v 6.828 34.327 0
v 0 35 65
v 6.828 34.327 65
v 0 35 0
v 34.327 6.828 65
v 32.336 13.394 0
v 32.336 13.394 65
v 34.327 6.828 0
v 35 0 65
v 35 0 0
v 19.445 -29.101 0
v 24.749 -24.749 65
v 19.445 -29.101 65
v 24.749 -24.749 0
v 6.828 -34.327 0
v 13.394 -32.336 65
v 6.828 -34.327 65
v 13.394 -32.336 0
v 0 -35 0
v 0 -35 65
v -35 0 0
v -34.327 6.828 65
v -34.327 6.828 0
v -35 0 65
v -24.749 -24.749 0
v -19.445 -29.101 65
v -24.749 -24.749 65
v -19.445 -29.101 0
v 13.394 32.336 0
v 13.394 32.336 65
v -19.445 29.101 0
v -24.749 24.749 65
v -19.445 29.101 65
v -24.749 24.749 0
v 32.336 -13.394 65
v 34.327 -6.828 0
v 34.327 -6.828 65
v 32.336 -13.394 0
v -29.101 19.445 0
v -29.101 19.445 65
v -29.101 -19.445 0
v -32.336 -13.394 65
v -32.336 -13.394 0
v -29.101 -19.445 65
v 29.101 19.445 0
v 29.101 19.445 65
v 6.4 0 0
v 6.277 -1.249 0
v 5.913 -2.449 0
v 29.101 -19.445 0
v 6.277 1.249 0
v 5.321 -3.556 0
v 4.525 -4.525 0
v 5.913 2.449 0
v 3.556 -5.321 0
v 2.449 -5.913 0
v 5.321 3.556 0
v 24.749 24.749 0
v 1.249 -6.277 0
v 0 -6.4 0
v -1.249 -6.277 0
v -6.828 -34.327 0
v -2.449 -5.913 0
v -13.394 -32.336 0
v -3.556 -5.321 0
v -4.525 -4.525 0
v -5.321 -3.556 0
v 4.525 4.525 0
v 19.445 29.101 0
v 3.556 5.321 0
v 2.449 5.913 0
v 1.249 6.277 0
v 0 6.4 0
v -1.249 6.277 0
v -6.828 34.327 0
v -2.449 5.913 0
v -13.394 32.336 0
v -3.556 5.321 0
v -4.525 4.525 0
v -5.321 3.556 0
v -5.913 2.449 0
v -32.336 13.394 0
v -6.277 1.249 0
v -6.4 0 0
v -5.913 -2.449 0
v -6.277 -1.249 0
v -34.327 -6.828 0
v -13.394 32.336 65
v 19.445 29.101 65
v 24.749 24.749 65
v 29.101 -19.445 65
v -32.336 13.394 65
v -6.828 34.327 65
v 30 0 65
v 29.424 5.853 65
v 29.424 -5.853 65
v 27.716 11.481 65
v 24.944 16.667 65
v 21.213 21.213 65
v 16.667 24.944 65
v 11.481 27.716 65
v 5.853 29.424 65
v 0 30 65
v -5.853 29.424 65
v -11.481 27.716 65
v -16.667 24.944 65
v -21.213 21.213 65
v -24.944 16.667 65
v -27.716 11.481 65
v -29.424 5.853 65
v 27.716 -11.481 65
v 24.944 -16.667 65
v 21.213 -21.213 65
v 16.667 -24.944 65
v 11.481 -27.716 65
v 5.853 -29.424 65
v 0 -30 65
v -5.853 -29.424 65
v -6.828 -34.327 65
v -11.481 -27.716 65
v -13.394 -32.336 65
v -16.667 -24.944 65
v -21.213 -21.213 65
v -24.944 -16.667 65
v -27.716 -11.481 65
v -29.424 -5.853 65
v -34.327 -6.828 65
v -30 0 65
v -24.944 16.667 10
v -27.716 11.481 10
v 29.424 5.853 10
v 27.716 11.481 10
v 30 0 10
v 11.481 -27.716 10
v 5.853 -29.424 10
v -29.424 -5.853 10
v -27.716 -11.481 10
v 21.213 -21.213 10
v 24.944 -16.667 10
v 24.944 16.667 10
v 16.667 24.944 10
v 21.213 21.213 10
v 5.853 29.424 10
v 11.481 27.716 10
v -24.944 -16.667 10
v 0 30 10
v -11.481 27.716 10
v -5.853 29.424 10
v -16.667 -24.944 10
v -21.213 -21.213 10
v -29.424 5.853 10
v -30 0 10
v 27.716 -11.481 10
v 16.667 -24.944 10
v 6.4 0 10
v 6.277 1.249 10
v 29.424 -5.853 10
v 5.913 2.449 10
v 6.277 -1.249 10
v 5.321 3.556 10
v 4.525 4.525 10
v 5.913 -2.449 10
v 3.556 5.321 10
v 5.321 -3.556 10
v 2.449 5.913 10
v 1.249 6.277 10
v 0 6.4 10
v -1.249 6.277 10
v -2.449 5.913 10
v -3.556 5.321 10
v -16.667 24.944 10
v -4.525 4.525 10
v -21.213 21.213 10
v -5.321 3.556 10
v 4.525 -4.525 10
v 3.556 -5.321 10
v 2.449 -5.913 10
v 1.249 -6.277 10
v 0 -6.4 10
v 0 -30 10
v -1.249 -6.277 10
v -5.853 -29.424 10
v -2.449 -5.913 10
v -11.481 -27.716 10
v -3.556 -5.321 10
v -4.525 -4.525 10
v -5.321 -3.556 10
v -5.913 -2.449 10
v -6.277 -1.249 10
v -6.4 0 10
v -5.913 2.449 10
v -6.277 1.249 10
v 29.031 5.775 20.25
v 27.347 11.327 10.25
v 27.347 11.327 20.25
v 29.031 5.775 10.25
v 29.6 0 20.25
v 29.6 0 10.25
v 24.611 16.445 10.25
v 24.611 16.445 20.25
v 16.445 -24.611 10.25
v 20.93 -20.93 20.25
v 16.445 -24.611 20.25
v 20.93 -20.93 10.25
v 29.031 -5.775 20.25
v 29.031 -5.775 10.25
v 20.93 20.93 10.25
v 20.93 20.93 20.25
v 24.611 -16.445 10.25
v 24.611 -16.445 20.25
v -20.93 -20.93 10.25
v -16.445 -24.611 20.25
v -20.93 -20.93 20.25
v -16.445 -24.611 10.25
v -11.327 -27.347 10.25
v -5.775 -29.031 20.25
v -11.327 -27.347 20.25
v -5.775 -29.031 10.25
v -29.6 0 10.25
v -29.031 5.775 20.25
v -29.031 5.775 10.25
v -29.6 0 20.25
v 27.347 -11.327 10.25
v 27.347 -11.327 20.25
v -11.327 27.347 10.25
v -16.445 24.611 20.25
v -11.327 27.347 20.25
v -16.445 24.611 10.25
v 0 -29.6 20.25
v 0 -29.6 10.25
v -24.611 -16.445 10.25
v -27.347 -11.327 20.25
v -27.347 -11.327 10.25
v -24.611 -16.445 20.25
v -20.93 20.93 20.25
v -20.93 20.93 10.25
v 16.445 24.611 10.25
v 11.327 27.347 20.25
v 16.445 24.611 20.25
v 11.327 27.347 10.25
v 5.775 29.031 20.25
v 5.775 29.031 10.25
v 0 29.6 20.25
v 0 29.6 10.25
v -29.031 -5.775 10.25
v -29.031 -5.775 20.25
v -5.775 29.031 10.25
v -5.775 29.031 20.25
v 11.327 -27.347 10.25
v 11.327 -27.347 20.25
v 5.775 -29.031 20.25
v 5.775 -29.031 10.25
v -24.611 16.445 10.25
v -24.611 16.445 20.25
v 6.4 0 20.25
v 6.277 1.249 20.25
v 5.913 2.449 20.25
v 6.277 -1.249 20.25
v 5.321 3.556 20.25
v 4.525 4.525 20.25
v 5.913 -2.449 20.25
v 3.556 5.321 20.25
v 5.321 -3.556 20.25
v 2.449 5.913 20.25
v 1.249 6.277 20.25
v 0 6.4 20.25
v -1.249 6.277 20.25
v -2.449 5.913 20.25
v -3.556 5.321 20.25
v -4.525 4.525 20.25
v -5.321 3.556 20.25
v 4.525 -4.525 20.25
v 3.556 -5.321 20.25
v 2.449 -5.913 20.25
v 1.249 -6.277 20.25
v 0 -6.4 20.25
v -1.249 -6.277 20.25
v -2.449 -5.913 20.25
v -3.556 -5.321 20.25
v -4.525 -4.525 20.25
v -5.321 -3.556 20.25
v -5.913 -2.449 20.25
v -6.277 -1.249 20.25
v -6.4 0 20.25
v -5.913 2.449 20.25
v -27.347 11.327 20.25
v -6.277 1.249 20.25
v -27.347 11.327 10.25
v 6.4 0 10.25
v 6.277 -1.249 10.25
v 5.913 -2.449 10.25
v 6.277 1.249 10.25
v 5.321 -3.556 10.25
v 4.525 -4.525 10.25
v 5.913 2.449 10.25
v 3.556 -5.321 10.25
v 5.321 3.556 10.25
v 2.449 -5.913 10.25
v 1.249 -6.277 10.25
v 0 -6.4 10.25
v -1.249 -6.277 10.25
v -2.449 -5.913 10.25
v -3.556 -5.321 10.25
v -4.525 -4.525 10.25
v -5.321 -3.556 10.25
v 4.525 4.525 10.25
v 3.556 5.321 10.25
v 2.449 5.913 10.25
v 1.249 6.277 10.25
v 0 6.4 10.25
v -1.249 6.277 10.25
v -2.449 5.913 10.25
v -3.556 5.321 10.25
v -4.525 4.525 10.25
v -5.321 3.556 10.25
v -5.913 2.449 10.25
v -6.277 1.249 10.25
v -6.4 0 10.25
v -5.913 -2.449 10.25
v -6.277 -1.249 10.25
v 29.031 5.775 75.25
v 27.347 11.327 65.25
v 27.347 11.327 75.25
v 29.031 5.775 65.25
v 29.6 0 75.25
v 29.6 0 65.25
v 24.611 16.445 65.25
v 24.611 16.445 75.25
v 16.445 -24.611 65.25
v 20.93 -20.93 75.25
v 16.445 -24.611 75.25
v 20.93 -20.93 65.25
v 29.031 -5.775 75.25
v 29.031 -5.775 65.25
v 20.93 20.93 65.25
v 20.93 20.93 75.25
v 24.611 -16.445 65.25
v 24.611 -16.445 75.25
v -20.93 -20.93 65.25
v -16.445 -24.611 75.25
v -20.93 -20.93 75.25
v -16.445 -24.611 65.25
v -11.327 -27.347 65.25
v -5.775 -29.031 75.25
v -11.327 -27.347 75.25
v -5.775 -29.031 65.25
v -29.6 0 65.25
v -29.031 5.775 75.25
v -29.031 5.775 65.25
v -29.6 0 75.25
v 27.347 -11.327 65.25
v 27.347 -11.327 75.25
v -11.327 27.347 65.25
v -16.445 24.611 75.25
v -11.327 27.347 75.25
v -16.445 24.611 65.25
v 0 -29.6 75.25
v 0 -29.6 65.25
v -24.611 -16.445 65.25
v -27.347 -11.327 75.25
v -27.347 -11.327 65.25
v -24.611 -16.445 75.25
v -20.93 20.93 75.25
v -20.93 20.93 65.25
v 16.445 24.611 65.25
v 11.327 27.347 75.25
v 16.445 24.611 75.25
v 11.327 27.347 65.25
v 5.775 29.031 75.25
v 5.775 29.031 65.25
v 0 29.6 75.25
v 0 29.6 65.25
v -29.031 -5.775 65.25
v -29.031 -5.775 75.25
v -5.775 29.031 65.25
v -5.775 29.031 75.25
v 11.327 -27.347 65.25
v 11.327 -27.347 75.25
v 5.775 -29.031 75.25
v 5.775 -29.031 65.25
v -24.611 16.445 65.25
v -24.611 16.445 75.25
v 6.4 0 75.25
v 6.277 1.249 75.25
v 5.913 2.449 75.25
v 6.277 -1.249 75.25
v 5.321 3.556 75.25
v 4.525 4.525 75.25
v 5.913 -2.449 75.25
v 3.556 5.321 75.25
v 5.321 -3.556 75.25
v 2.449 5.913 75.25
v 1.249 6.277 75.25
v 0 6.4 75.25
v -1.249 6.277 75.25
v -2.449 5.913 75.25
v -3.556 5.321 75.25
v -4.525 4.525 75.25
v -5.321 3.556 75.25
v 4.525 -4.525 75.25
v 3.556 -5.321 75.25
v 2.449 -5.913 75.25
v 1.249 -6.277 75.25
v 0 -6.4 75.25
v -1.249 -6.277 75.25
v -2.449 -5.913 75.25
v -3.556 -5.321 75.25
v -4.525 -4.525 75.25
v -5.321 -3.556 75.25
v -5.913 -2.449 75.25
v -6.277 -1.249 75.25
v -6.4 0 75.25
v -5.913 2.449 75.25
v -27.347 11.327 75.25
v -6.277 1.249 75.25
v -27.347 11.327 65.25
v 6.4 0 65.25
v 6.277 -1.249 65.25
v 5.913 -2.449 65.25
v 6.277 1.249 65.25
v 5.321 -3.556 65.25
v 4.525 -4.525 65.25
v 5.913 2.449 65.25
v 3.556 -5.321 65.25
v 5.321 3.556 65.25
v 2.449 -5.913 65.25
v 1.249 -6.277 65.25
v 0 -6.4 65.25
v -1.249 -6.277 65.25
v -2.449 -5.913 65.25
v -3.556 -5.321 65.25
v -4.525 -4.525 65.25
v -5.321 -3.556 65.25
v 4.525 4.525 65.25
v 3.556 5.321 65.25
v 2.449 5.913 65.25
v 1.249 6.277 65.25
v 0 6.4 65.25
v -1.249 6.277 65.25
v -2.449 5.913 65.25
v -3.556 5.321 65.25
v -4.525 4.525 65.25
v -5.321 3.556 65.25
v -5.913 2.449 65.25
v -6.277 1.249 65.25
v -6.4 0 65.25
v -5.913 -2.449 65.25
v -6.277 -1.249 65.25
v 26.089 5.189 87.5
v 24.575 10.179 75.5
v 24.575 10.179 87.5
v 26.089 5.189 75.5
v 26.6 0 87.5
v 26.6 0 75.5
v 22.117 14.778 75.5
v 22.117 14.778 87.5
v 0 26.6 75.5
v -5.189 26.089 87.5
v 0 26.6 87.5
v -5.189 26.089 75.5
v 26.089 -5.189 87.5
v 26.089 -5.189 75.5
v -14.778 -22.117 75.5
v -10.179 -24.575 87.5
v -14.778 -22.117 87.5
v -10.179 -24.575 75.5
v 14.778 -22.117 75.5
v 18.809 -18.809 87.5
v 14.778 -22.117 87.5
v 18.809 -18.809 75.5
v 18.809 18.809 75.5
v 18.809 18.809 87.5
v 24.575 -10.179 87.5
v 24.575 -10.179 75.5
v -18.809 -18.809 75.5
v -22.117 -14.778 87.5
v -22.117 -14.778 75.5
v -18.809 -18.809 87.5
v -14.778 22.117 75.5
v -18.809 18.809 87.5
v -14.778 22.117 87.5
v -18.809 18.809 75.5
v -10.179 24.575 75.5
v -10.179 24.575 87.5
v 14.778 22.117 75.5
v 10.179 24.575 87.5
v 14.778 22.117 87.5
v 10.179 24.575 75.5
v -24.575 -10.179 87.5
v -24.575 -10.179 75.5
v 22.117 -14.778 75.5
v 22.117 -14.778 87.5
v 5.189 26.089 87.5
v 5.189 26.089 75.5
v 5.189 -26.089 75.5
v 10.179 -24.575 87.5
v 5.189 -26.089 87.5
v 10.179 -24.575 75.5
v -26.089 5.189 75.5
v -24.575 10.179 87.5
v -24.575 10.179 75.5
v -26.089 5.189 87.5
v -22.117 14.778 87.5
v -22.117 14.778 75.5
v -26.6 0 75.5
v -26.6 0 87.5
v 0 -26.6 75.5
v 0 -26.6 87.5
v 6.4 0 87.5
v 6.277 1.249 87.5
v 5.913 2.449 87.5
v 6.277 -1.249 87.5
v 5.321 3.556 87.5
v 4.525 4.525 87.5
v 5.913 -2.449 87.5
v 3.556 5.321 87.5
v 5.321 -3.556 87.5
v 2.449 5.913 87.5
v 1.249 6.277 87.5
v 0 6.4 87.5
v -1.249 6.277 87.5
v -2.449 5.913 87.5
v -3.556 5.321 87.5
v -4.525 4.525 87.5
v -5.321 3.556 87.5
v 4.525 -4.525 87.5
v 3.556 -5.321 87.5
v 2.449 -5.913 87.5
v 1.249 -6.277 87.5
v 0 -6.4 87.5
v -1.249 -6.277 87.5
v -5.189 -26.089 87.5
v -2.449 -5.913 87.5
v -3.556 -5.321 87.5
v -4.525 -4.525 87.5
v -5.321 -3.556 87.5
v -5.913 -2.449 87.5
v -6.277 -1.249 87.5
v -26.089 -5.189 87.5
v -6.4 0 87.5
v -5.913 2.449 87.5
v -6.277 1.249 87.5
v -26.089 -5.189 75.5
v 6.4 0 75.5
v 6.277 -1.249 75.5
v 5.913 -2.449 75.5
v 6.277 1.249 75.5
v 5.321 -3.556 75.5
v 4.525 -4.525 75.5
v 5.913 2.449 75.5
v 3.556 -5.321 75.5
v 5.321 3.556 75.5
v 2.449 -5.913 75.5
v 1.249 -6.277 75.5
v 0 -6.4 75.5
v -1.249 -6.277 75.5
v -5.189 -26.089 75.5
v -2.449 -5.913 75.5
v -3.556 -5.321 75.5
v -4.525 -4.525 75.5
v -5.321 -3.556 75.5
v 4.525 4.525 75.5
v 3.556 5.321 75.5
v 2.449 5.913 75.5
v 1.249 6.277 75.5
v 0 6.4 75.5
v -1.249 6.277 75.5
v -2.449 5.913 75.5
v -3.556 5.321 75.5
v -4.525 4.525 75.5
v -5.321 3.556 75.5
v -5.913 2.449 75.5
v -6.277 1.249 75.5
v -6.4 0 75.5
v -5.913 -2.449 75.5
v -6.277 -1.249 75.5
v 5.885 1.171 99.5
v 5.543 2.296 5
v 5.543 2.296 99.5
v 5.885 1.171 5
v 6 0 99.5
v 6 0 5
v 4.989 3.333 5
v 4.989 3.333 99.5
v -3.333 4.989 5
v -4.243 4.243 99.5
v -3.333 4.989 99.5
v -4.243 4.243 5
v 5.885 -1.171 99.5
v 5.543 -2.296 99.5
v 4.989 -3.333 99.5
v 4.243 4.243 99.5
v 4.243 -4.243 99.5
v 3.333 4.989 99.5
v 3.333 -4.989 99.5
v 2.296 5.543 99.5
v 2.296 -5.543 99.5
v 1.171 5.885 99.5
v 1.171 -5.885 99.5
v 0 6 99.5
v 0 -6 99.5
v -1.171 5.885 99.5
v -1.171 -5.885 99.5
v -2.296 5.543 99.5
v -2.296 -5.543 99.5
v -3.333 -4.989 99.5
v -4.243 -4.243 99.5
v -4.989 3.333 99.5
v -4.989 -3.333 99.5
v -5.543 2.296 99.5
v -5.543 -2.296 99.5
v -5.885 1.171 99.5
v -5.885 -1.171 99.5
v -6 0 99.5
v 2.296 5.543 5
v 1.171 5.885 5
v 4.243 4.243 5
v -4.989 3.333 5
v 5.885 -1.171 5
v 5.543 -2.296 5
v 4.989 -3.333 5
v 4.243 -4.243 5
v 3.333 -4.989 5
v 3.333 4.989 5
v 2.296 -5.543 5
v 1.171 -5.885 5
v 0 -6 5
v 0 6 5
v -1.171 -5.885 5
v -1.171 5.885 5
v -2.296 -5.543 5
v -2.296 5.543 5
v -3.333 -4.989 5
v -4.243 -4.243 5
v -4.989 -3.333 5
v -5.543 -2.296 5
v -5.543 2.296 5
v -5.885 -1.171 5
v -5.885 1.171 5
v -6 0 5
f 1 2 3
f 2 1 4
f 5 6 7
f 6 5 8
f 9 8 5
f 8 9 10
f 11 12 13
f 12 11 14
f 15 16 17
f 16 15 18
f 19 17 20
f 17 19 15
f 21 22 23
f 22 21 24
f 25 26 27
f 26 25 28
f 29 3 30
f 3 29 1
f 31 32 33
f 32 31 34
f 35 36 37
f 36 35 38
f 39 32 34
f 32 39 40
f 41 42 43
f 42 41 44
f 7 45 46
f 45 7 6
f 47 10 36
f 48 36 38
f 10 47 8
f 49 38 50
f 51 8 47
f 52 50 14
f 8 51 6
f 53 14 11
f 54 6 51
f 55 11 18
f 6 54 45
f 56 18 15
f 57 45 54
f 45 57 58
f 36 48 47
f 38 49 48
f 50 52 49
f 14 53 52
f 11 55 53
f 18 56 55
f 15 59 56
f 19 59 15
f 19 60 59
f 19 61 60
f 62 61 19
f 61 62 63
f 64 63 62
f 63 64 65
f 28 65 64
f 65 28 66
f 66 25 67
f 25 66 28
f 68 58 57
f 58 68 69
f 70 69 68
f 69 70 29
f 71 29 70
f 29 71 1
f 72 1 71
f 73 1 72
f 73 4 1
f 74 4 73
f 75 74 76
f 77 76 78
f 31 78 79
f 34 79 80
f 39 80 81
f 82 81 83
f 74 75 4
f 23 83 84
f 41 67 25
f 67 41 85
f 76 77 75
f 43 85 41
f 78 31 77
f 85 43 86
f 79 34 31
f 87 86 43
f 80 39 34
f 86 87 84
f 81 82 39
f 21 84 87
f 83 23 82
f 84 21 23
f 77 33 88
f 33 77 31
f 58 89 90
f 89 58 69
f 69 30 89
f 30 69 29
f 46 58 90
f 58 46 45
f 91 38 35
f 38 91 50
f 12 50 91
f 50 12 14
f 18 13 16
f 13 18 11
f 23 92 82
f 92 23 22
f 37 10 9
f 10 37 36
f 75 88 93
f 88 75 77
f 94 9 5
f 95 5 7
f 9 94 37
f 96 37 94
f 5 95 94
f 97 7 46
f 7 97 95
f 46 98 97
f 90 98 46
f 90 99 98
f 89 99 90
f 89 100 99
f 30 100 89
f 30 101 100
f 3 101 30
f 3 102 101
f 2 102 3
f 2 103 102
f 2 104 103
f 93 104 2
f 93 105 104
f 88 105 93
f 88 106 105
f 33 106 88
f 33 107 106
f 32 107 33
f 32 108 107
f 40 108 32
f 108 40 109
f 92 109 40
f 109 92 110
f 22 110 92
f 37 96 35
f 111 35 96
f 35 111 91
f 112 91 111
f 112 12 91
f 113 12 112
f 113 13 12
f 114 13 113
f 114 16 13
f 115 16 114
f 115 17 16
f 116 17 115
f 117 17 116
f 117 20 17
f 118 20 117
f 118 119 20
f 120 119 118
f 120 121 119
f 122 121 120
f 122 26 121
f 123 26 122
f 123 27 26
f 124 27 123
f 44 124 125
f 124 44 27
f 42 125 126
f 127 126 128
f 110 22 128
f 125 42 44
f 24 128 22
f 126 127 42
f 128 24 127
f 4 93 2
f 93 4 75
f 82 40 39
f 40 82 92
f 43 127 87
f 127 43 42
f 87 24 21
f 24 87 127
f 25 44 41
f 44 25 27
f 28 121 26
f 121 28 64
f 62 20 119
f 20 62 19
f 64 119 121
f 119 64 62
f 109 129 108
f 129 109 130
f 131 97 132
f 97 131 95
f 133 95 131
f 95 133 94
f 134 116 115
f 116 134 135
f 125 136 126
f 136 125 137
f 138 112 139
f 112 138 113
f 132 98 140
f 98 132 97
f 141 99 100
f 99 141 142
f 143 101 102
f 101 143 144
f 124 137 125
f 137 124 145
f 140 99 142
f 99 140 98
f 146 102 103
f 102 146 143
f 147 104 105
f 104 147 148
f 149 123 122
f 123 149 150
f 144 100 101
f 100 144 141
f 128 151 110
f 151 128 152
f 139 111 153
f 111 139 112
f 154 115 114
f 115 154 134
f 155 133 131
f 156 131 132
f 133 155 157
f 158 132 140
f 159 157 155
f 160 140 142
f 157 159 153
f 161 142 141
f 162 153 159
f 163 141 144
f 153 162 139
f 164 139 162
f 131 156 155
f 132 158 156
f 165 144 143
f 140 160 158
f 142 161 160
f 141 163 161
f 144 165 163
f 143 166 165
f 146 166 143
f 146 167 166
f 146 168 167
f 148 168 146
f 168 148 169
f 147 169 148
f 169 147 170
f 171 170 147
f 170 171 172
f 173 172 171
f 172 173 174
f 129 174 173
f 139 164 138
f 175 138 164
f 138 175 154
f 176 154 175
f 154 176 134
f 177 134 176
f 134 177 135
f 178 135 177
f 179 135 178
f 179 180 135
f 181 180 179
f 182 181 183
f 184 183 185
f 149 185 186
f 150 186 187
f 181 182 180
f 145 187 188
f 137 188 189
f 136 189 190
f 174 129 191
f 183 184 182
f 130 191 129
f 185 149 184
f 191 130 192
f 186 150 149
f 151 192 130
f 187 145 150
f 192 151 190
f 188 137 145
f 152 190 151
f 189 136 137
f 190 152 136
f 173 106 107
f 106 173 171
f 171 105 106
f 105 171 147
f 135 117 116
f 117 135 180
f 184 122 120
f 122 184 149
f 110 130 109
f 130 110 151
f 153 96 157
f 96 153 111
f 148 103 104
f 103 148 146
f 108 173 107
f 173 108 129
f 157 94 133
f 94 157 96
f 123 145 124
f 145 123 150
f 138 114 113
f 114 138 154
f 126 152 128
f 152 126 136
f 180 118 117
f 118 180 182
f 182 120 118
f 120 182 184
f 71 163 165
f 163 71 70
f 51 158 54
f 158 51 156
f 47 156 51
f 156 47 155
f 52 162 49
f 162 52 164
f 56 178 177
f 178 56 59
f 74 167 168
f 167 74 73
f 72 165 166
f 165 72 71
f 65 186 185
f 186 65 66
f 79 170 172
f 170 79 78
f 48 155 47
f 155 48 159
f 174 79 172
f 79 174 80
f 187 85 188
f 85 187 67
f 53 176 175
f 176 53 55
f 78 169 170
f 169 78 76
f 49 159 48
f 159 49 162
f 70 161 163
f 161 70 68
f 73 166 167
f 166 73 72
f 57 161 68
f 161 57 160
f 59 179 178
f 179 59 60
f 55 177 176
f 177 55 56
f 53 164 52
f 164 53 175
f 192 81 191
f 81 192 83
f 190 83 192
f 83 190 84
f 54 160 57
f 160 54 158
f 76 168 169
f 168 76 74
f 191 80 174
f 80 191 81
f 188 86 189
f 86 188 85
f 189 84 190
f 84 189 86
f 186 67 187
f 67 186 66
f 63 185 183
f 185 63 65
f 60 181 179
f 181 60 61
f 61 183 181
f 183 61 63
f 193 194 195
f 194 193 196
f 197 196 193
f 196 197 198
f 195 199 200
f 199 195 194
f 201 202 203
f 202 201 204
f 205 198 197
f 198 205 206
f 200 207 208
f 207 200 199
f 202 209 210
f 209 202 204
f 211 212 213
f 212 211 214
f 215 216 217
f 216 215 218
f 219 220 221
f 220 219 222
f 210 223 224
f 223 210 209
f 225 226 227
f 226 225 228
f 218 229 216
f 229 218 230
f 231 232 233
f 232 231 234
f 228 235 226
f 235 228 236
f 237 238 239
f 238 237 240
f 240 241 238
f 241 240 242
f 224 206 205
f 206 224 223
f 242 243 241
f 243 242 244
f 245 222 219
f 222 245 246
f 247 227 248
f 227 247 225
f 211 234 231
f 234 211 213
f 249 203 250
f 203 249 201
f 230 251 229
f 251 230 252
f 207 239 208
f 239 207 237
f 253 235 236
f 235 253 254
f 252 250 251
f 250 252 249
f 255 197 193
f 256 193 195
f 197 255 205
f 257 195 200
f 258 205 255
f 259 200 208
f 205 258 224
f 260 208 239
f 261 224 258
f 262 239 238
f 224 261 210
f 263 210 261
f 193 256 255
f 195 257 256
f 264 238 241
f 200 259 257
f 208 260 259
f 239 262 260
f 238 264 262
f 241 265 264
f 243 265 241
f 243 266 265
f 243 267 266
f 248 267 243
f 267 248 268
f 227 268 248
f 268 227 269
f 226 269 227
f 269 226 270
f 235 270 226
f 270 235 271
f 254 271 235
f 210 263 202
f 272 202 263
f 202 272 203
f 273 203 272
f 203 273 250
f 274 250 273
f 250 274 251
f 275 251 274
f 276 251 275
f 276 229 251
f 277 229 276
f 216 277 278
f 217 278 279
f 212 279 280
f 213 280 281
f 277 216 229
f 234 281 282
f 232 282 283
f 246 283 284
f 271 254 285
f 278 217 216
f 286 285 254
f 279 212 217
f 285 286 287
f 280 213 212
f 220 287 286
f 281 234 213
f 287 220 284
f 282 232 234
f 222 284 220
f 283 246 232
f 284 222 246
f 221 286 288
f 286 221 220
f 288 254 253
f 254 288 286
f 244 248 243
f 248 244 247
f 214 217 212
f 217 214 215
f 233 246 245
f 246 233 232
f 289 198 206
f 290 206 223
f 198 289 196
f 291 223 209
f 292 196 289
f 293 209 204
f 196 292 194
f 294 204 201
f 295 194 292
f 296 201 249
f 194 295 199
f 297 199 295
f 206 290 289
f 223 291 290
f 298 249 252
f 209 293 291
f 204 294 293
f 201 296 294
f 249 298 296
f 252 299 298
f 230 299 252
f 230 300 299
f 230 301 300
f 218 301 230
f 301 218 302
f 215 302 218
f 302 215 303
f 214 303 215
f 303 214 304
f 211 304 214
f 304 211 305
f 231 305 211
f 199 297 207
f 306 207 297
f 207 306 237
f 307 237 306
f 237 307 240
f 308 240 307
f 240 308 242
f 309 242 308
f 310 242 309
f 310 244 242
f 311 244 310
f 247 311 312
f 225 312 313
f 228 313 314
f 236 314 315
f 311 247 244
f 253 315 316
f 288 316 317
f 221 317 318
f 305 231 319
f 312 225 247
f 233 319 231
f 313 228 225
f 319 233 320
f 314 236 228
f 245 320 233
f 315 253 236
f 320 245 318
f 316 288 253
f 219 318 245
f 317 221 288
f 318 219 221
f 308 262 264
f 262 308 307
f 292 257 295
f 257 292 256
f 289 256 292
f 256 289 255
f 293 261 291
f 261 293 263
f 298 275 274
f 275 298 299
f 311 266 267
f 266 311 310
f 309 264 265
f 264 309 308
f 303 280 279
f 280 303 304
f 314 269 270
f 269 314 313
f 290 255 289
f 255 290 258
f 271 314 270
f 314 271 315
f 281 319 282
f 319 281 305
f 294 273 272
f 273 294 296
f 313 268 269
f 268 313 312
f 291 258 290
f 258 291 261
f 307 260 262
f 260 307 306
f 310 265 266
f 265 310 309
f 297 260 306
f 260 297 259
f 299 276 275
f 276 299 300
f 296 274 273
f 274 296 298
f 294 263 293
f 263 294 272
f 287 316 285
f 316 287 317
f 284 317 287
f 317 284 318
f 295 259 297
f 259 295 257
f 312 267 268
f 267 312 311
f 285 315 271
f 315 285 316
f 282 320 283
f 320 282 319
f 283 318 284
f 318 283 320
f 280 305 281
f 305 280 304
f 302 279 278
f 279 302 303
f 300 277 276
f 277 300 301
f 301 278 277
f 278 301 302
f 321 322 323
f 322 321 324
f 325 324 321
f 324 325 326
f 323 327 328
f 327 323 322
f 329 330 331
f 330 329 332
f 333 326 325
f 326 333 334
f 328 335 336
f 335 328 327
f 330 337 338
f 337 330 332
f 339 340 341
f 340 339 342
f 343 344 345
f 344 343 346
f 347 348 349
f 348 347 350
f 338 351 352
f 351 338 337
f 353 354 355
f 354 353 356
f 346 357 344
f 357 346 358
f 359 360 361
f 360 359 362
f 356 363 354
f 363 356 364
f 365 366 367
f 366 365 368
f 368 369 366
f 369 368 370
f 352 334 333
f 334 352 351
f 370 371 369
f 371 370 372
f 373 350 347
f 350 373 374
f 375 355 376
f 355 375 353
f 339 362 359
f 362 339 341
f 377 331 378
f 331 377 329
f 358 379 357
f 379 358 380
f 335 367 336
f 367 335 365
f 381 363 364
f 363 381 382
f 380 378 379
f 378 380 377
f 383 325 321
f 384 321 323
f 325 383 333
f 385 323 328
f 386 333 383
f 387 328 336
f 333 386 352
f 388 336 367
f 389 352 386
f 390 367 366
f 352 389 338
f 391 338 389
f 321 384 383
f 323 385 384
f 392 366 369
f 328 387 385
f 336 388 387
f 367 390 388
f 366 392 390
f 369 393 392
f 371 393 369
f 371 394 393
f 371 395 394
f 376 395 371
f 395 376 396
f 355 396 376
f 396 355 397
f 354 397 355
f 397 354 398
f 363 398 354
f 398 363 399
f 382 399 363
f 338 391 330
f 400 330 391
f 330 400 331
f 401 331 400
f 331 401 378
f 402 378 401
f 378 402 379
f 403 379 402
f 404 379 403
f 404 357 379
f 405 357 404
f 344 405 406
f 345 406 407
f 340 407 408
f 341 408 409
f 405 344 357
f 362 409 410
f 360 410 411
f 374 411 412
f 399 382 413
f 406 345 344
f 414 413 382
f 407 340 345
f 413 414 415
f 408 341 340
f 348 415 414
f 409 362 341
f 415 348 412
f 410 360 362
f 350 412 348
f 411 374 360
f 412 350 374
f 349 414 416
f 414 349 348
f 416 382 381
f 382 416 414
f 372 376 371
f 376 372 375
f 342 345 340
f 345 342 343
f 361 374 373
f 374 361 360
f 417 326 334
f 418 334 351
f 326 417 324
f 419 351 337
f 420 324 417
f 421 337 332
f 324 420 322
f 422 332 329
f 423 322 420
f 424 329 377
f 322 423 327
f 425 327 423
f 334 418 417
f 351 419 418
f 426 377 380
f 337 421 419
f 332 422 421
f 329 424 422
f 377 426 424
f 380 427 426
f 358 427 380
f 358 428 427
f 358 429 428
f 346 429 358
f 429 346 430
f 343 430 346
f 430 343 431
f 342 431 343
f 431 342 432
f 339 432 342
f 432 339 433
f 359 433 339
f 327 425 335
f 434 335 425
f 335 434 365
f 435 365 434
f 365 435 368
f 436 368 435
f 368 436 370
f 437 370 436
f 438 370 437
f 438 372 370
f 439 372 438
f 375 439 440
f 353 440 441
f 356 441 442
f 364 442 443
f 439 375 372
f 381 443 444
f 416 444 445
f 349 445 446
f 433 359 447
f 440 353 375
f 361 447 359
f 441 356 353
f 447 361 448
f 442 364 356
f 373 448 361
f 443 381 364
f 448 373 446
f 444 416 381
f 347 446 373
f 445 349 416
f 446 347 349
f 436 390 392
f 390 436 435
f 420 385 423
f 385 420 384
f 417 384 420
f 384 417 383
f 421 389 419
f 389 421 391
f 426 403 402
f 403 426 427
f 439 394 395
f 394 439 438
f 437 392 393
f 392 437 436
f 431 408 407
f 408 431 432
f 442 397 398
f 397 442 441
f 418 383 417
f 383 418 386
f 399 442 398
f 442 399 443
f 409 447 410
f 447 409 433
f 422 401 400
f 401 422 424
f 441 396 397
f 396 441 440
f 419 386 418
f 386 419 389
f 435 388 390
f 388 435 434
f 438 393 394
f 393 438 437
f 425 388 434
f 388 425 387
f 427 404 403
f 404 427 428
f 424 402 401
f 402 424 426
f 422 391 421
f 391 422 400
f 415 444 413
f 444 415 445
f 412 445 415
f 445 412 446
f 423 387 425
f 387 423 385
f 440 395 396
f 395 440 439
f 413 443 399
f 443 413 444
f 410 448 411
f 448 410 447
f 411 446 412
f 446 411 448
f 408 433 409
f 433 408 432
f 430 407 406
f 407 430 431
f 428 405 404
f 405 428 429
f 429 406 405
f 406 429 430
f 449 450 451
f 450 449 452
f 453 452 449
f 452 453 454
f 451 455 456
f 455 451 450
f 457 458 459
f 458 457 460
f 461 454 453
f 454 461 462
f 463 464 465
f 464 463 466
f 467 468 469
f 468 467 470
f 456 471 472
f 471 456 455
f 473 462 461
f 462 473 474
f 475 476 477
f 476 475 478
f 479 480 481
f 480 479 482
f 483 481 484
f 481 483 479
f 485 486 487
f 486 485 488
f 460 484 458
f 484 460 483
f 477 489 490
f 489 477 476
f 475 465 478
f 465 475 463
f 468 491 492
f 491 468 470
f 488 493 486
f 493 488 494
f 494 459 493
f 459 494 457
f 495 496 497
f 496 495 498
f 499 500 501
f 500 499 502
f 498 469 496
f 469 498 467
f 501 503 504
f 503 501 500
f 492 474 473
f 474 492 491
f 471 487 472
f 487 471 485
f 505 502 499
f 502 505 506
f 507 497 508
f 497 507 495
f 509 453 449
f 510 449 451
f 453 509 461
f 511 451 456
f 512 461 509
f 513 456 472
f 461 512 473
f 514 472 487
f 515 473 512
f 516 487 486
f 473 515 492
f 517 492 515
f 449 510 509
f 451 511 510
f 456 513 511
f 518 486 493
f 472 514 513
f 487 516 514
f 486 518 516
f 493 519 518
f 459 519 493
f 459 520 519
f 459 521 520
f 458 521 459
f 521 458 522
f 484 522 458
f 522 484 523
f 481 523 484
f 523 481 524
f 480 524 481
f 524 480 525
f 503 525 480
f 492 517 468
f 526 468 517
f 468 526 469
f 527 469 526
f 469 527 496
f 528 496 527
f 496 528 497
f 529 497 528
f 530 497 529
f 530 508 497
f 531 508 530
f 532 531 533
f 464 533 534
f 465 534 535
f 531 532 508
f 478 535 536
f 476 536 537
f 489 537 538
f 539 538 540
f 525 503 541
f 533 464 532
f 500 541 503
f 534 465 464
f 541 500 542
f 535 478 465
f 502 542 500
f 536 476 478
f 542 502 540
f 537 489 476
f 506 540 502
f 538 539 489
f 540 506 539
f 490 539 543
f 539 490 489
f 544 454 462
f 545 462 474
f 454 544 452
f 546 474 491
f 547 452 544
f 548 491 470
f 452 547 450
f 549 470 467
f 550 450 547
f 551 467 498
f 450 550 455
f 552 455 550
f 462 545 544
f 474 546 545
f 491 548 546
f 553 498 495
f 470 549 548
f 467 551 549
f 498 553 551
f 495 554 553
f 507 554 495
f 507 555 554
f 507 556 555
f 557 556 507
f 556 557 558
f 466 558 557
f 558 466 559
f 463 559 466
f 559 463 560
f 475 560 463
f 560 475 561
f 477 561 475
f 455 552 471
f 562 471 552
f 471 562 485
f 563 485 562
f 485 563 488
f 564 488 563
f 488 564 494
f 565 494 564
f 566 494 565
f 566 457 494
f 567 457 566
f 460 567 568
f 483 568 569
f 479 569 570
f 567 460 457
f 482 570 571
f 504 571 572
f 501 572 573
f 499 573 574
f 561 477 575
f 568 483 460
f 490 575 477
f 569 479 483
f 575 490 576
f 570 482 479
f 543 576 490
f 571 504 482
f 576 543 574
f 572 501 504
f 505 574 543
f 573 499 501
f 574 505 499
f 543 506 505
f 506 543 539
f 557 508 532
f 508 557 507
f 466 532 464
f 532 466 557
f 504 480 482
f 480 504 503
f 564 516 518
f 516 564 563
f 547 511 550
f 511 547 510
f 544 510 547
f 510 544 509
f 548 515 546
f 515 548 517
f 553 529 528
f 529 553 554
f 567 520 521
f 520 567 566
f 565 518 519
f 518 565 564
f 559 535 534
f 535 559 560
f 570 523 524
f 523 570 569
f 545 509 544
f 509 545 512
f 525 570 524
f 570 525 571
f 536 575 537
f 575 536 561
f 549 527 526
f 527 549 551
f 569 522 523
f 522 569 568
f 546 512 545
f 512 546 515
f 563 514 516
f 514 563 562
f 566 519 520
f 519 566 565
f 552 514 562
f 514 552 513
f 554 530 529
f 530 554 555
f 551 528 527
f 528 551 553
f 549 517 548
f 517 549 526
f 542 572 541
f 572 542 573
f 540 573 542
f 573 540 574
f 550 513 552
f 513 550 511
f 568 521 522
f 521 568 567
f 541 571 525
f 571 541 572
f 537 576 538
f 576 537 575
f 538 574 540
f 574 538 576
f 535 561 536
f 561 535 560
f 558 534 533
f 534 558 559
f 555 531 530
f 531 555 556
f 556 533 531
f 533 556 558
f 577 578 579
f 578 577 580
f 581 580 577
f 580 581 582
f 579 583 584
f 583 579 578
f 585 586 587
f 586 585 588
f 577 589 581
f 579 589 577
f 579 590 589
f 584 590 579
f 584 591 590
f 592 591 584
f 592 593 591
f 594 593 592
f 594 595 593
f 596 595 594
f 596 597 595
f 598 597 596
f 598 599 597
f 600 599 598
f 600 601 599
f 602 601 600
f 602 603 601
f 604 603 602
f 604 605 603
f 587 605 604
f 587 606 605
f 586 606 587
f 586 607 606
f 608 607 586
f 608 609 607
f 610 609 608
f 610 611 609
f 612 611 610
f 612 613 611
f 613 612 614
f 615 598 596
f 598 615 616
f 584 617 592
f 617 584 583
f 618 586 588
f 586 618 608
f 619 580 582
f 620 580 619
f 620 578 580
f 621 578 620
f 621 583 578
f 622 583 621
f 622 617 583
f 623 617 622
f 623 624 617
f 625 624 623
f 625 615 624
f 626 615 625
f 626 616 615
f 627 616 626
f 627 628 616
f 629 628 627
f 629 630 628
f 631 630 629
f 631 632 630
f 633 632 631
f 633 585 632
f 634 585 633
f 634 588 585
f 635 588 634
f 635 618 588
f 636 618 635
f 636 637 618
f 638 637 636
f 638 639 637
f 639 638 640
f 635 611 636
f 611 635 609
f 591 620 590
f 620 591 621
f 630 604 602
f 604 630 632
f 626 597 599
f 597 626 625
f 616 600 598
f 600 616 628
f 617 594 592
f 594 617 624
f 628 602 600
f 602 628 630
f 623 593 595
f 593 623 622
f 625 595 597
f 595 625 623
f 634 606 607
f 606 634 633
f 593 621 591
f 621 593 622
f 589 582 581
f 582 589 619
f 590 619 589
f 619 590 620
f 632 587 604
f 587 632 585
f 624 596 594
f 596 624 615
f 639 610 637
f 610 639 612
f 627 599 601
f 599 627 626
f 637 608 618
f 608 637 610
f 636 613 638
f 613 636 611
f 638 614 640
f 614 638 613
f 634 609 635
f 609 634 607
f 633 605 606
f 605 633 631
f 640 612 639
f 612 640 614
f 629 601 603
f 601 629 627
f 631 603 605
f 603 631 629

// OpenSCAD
$fn = 32;

// ------------------------------------------------------------------------
// Bearing housing: housing d70, two bearings and a shaft
// Every part is its own module, assembly() places them once.
// ------------------------------------------------------------------------

// --- part 1 ---
module housing() {
  difference() {
    cylinder(h = 65, d = 70);
    translate([0, 0, 10]) cylinder(h = 56, d = 60);
    translate([0, 0, -1]) cylinder(h = 12, d = 12.8);
  }
}

// --- part 2 ---
module bearing_lower() {
  difference() {
      translate([0, 0, 0]) cylinder(h = 10, d = 59.2);
      translate([0, 0, -1]) cylinder(h = 12, d = 12.8);
    }
}

// --- part 3 ---
module bearing_upper() {
  difference() {
      translate([0, 0, 0]) cylinder(h = 10, d = 59.2);
      translate([0, 0, -1]) cylinder(h = 12, d = 12.8);
    }
}

// --- part 4 ---
module spacer() {
  difference() {
      translate([0, 0, 0]) cylinder(h = 12, d = 53.2);
      translate([0, 0, -1]) cylinder(h = 14, d = 12.8);
    }
}

// --- part 5 ---
module shaft() {
  translate([0, 0, -47.25]) cylinder(h = 94.5, d = 12);
}

// --- assembly ---
module assembly() {
  translate([0, 0, 0]) rotate([0, 0, 0]) housing();
  translate([0, 0, 10.25]) rotate([0, 0, 0]) bearing_lower();
  translate([0, 0, 65.25]) rotate([0, 0, 0]) bearing_upper();
  translate([0, 0, 75.5]) rotate([0, 0, 0]) spacer();
  translate([0, 0, 52.25]) rotate([0, 0, 0]) shaft();
}

assembly();
